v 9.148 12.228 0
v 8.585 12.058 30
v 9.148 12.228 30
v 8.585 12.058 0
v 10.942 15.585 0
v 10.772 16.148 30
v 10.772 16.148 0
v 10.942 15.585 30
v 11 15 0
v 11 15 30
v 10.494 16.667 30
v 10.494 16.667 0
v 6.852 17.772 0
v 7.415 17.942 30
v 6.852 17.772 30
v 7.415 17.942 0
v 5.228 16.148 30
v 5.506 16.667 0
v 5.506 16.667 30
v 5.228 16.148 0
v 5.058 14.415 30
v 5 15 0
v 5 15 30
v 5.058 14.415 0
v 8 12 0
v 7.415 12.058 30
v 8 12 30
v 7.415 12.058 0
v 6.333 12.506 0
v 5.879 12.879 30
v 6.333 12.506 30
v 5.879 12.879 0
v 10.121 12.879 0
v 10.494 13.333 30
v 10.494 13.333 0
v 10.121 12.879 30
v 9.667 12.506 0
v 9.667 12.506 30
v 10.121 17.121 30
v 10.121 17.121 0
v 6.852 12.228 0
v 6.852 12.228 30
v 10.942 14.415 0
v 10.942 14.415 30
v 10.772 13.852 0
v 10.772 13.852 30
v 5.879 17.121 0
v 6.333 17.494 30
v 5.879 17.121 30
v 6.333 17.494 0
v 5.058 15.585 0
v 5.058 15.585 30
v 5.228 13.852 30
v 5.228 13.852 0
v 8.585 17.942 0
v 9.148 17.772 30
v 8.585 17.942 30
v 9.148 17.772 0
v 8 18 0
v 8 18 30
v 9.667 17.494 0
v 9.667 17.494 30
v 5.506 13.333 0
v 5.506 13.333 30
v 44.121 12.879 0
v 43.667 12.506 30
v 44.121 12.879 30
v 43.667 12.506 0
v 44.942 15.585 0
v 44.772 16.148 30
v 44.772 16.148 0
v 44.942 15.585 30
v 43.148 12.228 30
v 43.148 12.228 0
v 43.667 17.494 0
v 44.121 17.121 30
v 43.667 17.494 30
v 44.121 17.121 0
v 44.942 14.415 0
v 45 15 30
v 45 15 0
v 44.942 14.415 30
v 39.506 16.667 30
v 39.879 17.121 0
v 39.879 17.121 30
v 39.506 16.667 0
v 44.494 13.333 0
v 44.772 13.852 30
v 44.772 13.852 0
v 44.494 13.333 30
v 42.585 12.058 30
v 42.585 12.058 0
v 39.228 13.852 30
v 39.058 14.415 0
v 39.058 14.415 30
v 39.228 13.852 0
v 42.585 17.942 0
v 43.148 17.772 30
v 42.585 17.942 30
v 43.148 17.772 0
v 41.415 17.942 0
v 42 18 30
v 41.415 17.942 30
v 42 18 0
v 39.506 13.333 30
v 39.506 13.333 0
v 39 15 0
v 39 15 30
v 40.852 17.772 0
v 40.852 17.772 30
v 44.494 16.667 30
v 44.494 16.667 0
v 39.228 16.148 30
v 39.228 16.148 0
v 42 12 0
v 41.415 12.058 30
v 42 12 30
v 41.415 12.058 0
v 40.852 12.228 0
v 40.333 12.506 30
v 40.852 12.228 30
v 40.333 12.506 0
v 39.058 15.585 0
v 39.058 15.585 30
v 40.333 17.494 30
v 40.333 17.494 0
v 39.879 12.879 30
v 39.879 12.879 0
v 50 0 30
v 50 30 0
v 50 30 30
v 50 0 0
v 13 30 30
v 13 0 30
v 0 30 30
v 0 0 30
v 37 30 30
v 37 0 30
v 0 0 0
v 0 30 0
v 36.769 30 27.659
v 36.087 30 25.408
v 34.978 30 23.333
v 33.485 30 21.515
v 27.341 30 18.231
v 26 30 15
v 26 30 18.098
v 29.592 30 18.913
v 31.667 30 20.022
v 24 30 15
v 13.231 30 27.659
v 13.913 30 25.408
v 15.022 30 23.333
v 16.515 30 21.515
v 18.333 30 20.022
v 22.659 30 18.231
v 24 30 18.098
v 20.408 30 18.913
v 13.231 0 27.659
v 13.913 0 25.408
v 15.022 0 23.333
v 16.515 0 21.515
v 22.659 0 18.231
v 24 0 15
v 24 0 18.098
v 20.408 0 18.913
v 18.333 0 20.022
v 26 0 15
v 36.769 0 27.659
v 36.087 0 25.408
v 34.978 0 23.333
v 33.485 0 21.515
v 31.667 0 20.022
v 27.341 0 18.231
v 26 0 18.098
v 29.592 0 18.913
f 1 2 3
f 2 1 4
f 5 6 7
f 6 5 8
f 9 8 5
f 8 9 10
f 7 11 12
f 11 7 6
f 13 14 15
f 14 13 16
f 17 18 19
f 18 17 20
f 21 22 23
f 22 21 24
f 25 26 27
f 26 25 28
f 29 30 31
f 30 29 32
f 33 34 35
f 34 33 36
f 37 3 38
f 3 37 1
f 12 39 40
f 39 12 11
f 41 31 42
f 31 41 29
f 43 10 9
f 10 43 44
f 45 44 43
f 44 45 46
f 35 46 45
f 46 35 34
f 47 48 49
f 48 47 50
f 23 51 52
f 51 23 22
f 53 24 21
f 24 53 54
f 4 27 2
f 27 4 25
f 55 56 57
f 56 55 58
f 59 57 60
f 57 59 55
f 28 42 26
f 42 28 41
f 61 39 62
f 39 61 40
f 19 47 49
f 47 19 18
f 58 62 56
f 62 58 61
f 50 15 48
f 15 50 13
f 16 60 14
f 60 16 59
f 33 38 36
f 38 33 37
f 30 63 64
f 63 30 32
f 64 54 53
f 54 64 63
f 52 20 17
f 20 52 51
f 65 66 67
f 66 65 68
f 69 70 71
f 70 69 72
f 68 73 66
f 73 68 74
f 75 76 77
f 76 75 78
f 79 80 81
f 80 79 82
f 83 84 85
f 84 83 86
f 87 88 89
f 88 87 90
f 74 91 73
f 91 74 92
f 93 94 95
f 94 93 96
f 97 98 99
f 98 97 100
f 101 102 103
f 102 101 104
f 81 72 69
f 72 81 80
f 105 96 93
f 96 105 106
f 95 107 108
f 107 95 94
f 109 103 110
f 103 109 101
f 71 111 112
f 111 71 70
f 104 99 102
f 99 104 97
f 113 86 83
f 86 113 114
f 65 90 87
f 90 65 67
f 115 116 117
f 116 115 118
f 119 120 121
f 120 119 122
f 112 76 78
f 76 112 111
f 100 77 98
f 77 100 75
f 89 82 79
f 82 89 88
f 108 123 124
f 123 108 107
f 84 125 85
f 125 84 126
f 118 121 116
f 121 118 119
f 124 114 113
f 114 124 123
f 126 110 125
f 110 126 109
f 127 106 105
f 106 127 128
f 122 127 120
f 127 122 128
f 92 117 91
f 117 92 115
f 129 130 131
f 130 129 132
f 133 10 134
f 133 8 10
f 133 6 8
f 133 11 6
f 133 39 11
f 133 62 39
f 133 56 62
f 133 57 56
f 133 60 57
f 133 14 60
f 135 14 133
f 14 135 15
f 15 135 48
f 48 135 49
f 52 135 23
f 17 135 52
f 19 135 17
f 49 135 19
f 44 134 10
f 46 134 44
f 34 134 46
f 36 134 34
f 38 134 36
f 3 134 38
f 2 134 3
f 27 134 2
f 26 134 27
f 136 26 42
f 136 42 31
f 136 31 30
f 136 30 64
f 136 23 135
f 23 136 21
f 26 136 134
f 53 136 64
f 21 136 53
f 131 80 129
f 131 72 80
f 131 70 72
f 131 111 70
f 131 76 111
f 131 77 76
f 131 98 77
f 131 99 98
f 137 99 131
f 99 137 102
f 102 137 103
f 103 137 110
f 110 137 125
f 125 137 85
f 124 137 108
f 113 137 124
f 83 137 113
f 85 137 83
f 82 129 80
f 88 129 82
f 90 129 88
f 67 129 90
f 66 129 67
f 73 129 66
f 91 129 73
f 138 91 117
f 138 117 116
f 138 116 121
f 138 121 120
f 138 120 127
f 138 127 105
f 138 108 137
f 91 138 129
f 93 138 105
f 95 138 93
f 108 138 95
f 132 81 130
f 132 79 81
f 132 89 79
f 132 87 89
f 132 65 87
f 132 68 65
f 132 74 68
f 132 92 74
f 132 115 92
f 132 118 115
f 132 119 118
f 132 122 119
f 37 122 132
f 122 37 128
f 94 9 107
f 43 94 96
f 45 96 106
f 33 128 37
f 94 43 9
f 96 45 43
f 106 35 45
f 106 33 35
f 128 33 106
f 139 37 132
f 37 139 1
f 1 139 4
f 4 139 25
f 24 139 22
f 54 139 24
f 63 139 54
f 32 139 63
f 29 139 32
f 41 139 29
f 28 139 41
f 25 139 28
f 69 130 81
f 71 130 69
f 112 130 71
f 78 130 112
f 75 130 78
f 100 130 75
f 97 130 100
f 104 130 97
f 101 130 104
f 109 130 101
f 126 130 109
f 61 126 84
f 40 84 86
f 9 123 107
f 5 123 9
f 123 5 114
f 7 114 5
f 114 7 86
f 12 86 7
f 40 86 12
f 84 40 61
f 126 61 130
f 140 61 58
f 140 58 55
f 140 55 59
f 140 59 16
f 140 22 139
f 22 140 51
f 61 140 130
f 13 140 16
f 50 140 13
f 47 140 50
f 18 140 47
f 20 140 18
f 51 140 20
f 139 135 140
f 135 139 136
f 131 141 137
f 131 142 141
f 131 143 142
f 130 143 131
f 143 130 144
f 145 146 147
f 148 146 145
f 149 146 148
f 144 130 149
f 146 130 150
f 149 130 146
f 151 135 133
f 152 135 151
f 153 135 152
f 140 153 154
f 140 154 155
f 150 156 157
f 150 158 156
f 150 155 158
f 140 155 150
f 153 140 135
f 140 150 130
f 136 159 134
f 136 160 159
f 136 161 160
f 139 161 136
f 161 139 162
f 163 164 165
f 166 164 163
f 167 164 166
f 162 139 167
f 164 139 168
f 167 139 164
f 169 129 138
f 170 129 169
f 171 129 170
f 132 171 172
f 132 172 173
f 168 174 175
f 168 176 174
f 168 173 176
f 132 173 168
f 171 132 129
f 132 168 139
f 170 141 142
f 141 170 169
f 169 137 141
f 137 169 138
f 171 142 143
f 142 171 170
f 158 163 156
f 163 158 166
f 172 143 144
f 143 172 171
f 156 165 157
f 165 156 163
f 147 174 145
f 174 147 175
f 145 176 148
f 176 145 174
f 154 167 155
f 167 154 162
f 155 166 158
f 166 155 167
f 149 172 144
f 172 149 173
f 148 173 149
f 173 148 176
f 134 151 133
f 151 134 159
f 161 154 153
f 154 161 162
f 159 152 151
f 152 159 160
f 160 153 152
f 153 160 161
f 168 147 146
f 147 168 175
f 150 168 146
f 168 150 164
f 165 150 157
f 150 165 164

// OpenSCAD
$fn = 32;

// ----------------------------------------------------------------------
// Saddle clamp: split shaft clamp
// ----------------------------------------------------------------------

// --- parameters (mm) ---
blk_l = 50;               // block length, X
blk_w = 30;               // block width, Y
blk_h = 30;               // block height
clamp_r = 12;             // shaft groove radius
hole_r = 3;               // bolt hole radius
hole_m = 8;               // bolt hole margin from the ends
saw_w = 2;                // saw kerf width

saw_depth = clamp_r + 3;  // saw kerf depth

difference() {
  cube([blk_l, blk_w, blk_h]);
  translate([blk_l / 2, -1, blk_h])
    rotate([-90, 0, 0])
      cylinder(h = blk_w + 2, r = clamp_r);
  for (sx = [0, 1])
    translate([sx ? blk_l - hole_m : hole_m, blk_w / 2, -1])
      cylinder(r = hole_r, h = blk_h + 2);
  translate([blk_l / 2 - saw_w / 2, -1, blk_h - saw_depth])
    cube([saw_w, blk_w + 2, saw_depth + 1]);
}
